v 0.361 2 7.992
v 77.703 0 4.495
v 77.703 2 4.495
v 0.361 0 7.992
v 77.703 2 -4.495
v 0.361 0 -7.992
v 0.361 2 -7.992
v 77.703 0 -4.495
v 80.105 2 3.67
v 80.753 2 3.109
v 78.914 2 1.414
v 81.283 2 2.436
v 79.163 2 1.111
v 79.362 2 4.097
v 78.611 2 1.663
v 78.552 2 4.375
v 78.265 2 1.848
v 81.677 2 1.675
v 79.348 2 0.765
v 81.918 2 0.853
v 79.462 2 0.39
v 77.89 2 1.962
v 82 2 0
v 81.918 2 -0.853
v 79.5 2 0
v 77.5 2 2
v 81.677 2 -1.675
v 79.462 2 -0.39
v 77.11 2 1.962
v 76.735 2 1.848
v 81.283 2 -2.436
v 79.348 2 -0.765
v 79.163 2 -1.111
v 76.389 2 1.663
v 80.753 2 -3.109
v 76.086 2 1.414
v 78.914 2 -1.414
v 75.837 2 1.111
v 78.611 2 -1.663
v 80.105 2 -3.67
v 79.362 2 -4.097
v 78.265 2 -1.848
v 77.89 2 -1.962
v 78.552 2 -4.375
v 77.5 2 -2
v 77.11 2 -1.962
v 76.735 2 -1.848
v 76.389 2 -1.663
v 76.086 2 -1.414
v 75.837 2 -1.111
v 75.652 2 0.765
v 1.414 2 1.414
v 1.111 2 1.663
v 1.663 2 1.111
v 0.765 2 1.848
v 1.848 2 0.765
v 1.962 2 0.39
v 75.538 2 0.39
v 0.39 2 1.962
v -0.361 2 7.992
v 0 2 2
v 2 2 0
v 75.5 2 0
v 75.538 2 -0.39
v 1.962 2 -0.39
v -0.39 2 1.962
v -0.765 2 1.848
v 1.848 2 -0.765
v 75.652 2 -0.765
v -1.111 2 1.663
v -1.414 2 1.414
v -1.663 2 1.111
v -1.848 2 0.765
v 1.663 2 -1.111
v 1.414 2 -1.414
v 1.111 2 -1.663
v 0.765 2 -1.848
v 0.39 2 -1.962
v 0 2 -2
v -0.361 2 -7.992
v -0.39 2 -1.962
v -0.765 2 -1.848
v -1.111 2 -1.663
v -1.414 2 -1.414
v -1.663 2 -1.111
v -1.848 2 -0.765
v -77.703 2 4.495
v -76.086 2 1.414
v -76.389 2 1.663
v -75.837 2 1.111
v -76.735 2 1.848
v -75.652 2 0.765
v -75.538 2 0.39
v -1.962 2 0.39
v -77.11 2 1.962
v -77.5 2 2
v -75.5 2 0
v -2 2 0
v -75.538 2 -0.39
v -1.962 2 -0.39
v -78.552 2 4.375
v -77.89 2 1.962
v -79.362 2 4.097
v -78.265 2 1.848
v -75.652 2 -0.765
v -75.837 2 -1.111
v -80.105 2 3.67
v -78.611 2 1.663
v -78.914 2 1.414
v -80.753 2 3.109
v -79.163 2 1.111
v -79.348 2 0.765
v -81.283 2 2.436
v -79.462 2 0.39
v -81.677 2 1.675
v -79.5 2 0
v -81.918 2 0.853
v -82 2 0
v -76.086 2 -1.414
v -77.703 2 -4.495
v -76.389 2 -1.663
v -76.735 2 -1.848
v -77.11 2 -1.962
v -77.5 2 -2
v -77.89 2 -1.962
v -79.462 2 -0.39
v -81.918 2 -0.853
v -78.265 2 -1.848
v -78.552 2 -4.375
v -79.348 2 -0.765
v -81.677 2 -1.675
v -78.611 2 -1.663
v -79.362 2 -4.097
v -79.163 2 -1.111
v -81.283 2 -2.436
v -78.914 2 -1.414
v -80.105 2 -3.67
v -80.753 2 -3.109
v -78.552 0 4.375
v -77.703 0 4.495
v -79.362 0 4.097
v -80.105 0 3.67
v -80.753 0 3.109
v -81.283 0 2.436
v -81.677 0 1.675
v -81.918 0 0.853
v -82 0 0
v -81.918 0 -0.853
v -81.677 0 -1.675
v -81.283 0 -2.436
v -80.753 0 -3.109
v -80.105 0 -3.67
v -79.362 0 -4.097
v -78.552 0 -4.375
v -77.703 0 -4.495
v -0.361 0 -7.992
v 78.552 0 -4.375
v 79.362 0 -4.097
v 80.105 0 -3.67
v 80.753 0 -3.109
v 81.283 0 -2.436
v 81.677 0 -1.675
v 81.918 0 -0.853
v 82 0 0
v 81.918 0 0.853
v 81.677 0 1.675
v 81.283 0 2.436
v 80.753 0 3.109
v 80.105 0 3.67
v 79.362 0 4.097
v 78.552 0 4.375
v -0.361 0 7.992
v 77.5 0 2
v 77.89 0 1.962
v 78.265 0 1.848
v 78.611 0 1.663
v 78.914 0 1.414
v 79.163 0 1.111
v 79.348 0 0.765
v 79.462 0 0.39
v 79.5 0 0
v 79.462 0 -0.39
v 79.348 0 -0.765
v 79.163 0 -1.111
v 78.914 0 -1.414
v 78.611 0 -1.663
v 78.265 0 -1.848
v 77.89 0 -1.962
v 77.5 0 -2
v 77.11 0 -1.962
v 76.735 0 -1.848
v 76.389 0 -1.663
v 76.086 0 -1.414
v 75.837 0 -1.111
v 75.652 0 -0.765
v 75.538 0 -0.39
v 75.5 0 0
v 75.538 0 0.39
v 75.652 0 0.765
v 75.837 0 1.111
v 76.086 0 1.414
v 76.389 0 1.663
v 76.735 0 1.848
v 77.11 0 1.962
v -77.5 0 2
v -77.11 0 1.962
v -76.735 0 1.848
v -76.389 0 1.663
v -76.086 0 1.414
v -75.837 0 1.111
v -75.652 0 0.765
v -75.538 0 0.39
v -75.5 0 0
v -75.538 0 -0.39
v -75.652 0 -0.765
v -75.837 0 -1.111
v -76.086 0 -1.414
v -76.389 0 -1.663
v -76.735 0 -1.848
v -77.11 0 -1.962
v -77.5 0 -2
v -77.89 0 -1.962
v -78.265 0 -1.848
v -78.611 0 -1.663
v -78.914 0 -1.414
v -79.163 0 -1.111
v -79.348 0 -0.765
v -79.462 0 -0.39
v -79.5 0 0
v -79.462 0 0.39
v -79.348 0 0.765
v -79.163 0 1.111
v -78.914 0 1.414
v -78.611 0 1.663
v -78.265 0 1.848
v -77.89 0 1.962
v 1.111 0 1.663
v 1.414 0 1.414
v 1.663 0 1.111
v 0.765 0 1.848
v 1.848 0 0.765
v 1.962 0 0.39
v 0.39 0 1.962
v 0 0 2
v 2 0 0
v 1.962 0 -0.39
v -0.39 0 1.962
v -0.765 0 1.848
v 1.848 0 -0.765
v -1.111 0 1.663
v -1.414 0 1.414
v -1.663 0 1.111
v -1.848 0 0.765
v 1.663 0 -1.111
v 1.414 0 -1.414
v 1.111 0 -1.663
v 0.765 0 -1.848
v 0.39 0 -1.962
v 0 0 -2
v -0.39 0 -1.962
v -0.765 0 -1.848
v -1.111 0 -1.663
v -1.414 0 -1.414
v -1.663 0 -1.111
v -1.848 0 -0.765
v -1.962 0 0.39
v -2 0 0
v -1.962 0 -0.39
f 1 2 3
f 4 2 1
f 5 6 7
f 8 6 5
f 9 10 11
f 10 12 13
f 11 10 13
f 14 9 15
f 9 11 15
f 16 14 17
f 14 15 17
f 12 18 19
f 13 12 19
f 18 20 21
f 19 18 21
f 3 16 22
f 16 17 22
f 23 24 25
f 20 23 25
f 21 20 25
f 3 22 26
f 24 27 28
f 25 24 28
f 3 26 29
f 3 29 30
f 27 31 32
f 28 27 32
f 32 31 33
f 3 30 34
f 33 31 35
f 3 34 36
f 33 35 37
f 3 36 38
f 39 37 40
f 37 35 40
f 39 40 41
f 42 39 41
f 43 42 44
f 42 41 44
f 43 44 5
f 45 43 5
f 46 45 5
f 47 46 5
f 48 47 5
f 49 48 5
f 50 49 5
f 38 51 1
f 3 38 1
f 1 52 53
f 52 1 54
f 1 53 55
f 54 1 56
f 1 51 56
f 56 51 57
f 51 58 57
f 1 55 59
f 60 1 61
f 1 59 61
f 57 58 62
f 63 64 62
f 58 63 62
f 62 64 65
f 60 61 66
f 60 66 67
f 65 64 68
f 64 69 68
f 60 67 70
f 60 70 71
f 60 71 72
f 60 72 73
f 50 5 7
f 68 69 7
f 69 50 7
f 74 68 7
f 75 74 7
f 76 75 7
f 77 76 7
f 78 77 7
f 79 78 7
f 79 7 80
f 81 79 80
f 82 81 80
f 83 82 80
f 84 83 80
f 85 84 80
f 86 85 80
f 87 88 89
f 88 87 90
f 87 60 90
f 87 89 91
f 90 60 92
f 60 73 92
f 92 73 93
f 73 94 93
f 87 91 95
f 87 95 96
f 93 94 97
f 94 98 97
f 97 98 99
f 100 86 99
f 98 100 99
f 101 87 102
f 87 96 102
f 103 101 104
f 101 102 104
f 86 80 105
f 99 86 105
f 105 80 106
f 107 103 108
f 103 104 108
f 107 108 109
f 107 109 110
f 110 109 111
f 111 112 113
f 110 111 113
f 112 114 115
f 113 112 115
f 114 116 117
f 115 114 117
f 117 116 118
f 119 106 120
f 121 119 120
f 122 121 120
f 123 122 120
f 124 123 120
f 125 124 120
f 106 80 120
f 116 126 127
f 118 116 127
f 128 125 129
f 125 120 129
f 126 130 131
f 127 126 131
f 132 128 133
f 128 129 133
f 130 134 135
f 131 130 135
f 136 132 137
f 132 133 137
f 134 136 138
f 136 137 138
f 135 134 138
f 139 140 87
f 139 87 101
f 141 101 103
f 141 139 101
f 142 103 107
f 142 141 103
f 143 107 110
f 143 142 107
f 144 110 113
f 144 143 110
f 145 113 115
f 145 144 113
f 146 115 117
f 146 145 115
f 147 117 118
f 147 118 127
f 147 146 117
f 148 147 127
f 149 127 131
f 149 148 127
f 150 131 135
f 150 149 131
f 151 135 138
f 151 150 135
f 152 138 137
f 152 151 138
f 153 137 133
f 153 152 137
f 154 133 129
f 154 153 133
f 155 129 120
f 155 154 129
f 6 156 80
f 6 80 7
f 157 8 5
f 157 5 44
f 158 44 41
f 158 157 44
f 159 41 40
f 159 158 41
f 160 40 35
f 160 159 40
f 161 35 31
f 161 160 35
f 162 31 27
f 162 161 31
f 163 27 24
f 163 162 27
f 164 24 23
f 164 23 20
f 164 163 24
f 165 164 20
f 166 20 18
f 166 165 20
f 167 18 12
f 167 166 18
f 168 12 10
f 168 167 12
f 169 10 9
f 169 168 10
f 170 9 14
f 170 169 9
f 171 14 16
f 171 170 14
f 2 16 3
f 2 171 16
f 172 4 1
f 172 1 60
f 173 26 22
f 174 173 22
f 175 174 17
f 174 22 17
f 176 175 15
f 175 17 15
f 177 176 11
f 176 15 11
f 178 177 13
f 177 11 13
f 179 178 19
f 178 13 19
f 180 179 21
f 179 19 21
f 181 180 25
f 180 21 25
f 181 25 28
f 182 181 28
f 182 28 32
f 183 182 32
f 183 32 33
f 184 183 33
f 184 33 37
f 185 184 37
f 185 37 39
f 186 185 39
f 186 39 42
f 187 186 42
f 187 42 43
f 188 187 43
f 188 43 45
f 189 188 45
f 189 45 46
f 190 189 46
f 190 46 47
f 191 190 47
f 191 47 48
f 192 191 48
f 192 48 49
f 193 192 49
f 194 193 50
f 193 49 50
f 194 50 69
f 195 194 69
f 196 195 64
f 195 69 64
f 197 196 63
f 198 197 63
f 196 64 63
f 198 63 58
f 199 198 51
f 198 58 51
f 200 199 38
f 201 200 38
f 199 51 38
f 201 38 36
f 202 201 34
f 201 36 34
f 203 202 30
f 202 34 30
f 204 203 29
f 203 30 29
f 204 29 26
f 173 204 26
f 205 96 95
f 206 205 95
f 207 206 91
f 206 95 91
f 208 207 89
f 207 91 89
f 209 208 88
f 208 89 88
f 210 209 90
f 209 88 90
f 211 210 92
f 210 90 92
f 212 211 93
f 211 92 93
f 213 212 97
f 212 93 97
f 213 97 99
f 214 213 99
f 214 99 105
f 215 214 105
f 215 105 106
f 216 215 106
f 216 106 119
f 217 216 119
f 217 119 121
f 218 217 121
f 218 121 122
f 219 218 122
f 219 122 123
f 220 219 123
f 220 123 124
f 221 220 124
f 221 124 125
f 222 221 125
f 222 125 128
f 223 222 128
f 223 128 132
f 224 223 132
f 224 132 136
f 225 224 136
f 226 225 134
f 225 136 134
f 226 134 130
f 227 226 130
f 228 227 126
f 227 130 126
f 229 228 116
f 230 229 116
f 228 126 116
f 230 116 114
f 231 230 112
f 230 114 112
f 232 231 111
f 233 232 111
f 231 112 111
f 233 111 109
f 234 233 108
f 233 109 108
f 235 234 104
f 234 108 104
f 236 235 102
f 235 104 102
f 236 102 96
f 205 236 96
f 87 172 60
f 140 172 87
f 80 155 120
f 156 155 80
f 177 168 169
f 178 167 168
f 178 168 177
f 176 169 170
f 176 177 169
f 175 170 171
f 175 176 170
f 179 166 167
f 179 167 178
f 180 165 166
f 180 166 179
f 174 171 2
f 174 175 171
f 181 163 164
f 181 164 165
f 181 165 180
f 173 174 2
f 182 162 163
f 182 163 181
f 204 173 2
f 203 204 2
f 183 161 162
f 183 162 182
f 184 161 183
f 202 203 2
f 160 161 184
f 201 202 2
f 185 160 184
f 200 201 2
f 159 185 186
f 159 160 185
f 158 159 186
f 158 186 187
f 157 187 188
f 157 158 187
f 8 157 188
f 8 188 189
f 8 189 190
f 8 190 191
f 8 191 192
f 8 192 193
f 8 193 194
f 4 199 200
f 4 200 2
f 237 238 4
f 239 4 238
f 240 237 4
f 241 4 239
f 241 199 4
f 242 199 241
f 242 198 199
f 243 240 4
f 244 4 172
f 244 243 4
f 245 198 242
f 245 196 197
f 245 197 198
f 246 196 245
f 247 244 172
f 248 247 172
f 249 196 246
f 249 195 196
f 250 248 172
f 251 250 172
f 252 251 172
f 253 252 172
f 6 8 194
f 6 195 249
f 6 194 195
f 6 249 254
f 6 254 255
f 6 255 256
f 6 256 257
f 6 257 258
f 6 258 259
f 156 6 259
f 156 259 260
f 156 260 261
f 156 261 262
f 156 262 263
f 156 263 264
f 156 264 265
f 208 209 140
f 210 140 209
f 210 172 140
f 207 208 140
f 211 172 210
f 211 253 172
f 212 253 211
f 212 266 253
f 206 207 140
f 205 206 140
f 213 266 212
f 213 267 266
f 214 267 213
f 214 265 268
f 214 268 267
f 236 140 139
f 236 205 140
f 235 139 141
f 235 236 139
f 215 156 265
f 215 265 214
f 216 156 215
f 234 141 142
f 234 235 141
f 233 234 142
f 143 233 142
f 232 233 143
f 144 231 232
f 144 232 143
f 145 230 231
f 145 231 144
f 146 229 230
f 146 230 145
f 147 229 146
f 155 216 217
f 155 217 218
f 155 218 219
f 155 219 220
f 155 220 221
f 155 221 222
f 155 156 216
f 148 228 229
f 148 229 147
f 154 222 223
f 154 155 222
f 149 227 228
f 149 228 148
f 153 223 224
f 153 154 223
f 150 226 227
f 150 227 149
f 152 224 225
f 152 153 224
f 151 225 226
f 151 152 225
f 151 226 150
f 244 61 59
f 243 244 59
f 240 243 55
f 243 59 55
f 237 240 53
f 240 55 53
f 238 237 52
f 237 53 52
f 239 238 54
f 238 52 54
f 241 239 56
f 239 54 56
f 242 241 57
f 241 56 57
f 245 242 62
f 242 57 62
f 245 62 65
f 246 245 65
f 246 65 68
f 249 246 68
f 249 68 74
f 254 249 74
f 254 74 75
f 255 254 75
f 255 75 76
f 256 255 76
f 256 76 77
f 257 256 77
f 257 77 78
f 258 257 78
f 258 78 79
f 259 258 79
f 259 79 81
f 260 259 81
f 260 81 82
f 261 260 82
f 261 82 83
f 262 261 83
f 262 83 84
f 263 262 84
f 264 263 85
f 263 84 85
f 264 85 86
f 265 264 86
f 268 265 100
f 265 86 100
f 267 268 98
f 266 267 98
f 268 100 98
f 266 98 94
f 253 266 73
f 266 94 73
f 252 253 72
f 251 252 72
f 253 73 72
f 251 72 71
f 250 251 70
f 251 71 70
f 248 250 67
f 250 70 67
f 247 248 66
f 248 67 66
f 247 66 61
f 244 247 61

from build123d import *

# Parameters (mm, degrees)
EXTRUDE_448_DEPTH     = 2
SKETCH_2_R            = 2
CUT_EXTRUDE_659_DEPTH = 83.412799184
SKETCH_3_R            = 2
CUT_EXTRUDE_885_DEPTH = 83.412799184


with BuildPart() as part:
    # Эскиз1 → Extrude 448 (new body)
    with BuildSketch(Plane(origin=(0, 0, 0), x_dir=(1, 0, 0), z_dir=(0, 1, 0))):
        with BuildLine():
            Line((-77.703225806, 4.495408688), (-0.361290323, 7.991837667))
            Line((-0.361290323, 7.991837667), (0.361290323, 7.991837667))
            Line((0.361290323, 7.991837667), (77.703225806, 4.495408688))
            ThreePointArc((77.703225806, 4.495408688), (82, 0), (77.703225806, -4.495408688))
            Line((77.703225806, -4.495408688), (0.361290323, -7.991837667))
            Line((0.361290323, -7.991837667), (-0.361290323, -7.991837667))
            Line((-0.361290323, -7.991837667), (-77.703225806, -4.495408688))
            ThreePointArc((-77.703225806, -4.495408688), (-82, 0), (-77.703225806, 4.495408688))
        make_face()
    extrude(amount=EXTRUDE_448_DEPTH)

    # Эскиз2 → Cut-Extrude 659 (cut, through all)
    with BuildSketch(Plane(origin=(0, 2, 0), x_dir=(1, 0, 0), z_dir=(0, 1, 0))):
        with Locations(Location((0, 0, 0), (0, 0, 270))):
            Circle(SKETCH_2_R)
    extrude(amount=-CUT_EXTRUDE_659_DEPTH, mode=Mode.SUBTRACT)

    # Эскиз3 → Cut-Extrude 885 (cut, through all)
    with BuildSketch(Plane(origin=(0, 2, 0), x_dir=(1, 0, 0), z_dir=(0, 1, 0))):
        with Locations(Location((-77.5, 0, 0), (0, 0, 270))):
            Circle(SKETCH_3_R)
        with Locations(Location((77.5, 0, 0), (0, 0, 270))):
            Circle(SKETCH_3_R)
    extrude(amount=-CUT_EXTRUDE_885_DEPTH, mode=Mode.SUBTRACT)


solid = part.part
